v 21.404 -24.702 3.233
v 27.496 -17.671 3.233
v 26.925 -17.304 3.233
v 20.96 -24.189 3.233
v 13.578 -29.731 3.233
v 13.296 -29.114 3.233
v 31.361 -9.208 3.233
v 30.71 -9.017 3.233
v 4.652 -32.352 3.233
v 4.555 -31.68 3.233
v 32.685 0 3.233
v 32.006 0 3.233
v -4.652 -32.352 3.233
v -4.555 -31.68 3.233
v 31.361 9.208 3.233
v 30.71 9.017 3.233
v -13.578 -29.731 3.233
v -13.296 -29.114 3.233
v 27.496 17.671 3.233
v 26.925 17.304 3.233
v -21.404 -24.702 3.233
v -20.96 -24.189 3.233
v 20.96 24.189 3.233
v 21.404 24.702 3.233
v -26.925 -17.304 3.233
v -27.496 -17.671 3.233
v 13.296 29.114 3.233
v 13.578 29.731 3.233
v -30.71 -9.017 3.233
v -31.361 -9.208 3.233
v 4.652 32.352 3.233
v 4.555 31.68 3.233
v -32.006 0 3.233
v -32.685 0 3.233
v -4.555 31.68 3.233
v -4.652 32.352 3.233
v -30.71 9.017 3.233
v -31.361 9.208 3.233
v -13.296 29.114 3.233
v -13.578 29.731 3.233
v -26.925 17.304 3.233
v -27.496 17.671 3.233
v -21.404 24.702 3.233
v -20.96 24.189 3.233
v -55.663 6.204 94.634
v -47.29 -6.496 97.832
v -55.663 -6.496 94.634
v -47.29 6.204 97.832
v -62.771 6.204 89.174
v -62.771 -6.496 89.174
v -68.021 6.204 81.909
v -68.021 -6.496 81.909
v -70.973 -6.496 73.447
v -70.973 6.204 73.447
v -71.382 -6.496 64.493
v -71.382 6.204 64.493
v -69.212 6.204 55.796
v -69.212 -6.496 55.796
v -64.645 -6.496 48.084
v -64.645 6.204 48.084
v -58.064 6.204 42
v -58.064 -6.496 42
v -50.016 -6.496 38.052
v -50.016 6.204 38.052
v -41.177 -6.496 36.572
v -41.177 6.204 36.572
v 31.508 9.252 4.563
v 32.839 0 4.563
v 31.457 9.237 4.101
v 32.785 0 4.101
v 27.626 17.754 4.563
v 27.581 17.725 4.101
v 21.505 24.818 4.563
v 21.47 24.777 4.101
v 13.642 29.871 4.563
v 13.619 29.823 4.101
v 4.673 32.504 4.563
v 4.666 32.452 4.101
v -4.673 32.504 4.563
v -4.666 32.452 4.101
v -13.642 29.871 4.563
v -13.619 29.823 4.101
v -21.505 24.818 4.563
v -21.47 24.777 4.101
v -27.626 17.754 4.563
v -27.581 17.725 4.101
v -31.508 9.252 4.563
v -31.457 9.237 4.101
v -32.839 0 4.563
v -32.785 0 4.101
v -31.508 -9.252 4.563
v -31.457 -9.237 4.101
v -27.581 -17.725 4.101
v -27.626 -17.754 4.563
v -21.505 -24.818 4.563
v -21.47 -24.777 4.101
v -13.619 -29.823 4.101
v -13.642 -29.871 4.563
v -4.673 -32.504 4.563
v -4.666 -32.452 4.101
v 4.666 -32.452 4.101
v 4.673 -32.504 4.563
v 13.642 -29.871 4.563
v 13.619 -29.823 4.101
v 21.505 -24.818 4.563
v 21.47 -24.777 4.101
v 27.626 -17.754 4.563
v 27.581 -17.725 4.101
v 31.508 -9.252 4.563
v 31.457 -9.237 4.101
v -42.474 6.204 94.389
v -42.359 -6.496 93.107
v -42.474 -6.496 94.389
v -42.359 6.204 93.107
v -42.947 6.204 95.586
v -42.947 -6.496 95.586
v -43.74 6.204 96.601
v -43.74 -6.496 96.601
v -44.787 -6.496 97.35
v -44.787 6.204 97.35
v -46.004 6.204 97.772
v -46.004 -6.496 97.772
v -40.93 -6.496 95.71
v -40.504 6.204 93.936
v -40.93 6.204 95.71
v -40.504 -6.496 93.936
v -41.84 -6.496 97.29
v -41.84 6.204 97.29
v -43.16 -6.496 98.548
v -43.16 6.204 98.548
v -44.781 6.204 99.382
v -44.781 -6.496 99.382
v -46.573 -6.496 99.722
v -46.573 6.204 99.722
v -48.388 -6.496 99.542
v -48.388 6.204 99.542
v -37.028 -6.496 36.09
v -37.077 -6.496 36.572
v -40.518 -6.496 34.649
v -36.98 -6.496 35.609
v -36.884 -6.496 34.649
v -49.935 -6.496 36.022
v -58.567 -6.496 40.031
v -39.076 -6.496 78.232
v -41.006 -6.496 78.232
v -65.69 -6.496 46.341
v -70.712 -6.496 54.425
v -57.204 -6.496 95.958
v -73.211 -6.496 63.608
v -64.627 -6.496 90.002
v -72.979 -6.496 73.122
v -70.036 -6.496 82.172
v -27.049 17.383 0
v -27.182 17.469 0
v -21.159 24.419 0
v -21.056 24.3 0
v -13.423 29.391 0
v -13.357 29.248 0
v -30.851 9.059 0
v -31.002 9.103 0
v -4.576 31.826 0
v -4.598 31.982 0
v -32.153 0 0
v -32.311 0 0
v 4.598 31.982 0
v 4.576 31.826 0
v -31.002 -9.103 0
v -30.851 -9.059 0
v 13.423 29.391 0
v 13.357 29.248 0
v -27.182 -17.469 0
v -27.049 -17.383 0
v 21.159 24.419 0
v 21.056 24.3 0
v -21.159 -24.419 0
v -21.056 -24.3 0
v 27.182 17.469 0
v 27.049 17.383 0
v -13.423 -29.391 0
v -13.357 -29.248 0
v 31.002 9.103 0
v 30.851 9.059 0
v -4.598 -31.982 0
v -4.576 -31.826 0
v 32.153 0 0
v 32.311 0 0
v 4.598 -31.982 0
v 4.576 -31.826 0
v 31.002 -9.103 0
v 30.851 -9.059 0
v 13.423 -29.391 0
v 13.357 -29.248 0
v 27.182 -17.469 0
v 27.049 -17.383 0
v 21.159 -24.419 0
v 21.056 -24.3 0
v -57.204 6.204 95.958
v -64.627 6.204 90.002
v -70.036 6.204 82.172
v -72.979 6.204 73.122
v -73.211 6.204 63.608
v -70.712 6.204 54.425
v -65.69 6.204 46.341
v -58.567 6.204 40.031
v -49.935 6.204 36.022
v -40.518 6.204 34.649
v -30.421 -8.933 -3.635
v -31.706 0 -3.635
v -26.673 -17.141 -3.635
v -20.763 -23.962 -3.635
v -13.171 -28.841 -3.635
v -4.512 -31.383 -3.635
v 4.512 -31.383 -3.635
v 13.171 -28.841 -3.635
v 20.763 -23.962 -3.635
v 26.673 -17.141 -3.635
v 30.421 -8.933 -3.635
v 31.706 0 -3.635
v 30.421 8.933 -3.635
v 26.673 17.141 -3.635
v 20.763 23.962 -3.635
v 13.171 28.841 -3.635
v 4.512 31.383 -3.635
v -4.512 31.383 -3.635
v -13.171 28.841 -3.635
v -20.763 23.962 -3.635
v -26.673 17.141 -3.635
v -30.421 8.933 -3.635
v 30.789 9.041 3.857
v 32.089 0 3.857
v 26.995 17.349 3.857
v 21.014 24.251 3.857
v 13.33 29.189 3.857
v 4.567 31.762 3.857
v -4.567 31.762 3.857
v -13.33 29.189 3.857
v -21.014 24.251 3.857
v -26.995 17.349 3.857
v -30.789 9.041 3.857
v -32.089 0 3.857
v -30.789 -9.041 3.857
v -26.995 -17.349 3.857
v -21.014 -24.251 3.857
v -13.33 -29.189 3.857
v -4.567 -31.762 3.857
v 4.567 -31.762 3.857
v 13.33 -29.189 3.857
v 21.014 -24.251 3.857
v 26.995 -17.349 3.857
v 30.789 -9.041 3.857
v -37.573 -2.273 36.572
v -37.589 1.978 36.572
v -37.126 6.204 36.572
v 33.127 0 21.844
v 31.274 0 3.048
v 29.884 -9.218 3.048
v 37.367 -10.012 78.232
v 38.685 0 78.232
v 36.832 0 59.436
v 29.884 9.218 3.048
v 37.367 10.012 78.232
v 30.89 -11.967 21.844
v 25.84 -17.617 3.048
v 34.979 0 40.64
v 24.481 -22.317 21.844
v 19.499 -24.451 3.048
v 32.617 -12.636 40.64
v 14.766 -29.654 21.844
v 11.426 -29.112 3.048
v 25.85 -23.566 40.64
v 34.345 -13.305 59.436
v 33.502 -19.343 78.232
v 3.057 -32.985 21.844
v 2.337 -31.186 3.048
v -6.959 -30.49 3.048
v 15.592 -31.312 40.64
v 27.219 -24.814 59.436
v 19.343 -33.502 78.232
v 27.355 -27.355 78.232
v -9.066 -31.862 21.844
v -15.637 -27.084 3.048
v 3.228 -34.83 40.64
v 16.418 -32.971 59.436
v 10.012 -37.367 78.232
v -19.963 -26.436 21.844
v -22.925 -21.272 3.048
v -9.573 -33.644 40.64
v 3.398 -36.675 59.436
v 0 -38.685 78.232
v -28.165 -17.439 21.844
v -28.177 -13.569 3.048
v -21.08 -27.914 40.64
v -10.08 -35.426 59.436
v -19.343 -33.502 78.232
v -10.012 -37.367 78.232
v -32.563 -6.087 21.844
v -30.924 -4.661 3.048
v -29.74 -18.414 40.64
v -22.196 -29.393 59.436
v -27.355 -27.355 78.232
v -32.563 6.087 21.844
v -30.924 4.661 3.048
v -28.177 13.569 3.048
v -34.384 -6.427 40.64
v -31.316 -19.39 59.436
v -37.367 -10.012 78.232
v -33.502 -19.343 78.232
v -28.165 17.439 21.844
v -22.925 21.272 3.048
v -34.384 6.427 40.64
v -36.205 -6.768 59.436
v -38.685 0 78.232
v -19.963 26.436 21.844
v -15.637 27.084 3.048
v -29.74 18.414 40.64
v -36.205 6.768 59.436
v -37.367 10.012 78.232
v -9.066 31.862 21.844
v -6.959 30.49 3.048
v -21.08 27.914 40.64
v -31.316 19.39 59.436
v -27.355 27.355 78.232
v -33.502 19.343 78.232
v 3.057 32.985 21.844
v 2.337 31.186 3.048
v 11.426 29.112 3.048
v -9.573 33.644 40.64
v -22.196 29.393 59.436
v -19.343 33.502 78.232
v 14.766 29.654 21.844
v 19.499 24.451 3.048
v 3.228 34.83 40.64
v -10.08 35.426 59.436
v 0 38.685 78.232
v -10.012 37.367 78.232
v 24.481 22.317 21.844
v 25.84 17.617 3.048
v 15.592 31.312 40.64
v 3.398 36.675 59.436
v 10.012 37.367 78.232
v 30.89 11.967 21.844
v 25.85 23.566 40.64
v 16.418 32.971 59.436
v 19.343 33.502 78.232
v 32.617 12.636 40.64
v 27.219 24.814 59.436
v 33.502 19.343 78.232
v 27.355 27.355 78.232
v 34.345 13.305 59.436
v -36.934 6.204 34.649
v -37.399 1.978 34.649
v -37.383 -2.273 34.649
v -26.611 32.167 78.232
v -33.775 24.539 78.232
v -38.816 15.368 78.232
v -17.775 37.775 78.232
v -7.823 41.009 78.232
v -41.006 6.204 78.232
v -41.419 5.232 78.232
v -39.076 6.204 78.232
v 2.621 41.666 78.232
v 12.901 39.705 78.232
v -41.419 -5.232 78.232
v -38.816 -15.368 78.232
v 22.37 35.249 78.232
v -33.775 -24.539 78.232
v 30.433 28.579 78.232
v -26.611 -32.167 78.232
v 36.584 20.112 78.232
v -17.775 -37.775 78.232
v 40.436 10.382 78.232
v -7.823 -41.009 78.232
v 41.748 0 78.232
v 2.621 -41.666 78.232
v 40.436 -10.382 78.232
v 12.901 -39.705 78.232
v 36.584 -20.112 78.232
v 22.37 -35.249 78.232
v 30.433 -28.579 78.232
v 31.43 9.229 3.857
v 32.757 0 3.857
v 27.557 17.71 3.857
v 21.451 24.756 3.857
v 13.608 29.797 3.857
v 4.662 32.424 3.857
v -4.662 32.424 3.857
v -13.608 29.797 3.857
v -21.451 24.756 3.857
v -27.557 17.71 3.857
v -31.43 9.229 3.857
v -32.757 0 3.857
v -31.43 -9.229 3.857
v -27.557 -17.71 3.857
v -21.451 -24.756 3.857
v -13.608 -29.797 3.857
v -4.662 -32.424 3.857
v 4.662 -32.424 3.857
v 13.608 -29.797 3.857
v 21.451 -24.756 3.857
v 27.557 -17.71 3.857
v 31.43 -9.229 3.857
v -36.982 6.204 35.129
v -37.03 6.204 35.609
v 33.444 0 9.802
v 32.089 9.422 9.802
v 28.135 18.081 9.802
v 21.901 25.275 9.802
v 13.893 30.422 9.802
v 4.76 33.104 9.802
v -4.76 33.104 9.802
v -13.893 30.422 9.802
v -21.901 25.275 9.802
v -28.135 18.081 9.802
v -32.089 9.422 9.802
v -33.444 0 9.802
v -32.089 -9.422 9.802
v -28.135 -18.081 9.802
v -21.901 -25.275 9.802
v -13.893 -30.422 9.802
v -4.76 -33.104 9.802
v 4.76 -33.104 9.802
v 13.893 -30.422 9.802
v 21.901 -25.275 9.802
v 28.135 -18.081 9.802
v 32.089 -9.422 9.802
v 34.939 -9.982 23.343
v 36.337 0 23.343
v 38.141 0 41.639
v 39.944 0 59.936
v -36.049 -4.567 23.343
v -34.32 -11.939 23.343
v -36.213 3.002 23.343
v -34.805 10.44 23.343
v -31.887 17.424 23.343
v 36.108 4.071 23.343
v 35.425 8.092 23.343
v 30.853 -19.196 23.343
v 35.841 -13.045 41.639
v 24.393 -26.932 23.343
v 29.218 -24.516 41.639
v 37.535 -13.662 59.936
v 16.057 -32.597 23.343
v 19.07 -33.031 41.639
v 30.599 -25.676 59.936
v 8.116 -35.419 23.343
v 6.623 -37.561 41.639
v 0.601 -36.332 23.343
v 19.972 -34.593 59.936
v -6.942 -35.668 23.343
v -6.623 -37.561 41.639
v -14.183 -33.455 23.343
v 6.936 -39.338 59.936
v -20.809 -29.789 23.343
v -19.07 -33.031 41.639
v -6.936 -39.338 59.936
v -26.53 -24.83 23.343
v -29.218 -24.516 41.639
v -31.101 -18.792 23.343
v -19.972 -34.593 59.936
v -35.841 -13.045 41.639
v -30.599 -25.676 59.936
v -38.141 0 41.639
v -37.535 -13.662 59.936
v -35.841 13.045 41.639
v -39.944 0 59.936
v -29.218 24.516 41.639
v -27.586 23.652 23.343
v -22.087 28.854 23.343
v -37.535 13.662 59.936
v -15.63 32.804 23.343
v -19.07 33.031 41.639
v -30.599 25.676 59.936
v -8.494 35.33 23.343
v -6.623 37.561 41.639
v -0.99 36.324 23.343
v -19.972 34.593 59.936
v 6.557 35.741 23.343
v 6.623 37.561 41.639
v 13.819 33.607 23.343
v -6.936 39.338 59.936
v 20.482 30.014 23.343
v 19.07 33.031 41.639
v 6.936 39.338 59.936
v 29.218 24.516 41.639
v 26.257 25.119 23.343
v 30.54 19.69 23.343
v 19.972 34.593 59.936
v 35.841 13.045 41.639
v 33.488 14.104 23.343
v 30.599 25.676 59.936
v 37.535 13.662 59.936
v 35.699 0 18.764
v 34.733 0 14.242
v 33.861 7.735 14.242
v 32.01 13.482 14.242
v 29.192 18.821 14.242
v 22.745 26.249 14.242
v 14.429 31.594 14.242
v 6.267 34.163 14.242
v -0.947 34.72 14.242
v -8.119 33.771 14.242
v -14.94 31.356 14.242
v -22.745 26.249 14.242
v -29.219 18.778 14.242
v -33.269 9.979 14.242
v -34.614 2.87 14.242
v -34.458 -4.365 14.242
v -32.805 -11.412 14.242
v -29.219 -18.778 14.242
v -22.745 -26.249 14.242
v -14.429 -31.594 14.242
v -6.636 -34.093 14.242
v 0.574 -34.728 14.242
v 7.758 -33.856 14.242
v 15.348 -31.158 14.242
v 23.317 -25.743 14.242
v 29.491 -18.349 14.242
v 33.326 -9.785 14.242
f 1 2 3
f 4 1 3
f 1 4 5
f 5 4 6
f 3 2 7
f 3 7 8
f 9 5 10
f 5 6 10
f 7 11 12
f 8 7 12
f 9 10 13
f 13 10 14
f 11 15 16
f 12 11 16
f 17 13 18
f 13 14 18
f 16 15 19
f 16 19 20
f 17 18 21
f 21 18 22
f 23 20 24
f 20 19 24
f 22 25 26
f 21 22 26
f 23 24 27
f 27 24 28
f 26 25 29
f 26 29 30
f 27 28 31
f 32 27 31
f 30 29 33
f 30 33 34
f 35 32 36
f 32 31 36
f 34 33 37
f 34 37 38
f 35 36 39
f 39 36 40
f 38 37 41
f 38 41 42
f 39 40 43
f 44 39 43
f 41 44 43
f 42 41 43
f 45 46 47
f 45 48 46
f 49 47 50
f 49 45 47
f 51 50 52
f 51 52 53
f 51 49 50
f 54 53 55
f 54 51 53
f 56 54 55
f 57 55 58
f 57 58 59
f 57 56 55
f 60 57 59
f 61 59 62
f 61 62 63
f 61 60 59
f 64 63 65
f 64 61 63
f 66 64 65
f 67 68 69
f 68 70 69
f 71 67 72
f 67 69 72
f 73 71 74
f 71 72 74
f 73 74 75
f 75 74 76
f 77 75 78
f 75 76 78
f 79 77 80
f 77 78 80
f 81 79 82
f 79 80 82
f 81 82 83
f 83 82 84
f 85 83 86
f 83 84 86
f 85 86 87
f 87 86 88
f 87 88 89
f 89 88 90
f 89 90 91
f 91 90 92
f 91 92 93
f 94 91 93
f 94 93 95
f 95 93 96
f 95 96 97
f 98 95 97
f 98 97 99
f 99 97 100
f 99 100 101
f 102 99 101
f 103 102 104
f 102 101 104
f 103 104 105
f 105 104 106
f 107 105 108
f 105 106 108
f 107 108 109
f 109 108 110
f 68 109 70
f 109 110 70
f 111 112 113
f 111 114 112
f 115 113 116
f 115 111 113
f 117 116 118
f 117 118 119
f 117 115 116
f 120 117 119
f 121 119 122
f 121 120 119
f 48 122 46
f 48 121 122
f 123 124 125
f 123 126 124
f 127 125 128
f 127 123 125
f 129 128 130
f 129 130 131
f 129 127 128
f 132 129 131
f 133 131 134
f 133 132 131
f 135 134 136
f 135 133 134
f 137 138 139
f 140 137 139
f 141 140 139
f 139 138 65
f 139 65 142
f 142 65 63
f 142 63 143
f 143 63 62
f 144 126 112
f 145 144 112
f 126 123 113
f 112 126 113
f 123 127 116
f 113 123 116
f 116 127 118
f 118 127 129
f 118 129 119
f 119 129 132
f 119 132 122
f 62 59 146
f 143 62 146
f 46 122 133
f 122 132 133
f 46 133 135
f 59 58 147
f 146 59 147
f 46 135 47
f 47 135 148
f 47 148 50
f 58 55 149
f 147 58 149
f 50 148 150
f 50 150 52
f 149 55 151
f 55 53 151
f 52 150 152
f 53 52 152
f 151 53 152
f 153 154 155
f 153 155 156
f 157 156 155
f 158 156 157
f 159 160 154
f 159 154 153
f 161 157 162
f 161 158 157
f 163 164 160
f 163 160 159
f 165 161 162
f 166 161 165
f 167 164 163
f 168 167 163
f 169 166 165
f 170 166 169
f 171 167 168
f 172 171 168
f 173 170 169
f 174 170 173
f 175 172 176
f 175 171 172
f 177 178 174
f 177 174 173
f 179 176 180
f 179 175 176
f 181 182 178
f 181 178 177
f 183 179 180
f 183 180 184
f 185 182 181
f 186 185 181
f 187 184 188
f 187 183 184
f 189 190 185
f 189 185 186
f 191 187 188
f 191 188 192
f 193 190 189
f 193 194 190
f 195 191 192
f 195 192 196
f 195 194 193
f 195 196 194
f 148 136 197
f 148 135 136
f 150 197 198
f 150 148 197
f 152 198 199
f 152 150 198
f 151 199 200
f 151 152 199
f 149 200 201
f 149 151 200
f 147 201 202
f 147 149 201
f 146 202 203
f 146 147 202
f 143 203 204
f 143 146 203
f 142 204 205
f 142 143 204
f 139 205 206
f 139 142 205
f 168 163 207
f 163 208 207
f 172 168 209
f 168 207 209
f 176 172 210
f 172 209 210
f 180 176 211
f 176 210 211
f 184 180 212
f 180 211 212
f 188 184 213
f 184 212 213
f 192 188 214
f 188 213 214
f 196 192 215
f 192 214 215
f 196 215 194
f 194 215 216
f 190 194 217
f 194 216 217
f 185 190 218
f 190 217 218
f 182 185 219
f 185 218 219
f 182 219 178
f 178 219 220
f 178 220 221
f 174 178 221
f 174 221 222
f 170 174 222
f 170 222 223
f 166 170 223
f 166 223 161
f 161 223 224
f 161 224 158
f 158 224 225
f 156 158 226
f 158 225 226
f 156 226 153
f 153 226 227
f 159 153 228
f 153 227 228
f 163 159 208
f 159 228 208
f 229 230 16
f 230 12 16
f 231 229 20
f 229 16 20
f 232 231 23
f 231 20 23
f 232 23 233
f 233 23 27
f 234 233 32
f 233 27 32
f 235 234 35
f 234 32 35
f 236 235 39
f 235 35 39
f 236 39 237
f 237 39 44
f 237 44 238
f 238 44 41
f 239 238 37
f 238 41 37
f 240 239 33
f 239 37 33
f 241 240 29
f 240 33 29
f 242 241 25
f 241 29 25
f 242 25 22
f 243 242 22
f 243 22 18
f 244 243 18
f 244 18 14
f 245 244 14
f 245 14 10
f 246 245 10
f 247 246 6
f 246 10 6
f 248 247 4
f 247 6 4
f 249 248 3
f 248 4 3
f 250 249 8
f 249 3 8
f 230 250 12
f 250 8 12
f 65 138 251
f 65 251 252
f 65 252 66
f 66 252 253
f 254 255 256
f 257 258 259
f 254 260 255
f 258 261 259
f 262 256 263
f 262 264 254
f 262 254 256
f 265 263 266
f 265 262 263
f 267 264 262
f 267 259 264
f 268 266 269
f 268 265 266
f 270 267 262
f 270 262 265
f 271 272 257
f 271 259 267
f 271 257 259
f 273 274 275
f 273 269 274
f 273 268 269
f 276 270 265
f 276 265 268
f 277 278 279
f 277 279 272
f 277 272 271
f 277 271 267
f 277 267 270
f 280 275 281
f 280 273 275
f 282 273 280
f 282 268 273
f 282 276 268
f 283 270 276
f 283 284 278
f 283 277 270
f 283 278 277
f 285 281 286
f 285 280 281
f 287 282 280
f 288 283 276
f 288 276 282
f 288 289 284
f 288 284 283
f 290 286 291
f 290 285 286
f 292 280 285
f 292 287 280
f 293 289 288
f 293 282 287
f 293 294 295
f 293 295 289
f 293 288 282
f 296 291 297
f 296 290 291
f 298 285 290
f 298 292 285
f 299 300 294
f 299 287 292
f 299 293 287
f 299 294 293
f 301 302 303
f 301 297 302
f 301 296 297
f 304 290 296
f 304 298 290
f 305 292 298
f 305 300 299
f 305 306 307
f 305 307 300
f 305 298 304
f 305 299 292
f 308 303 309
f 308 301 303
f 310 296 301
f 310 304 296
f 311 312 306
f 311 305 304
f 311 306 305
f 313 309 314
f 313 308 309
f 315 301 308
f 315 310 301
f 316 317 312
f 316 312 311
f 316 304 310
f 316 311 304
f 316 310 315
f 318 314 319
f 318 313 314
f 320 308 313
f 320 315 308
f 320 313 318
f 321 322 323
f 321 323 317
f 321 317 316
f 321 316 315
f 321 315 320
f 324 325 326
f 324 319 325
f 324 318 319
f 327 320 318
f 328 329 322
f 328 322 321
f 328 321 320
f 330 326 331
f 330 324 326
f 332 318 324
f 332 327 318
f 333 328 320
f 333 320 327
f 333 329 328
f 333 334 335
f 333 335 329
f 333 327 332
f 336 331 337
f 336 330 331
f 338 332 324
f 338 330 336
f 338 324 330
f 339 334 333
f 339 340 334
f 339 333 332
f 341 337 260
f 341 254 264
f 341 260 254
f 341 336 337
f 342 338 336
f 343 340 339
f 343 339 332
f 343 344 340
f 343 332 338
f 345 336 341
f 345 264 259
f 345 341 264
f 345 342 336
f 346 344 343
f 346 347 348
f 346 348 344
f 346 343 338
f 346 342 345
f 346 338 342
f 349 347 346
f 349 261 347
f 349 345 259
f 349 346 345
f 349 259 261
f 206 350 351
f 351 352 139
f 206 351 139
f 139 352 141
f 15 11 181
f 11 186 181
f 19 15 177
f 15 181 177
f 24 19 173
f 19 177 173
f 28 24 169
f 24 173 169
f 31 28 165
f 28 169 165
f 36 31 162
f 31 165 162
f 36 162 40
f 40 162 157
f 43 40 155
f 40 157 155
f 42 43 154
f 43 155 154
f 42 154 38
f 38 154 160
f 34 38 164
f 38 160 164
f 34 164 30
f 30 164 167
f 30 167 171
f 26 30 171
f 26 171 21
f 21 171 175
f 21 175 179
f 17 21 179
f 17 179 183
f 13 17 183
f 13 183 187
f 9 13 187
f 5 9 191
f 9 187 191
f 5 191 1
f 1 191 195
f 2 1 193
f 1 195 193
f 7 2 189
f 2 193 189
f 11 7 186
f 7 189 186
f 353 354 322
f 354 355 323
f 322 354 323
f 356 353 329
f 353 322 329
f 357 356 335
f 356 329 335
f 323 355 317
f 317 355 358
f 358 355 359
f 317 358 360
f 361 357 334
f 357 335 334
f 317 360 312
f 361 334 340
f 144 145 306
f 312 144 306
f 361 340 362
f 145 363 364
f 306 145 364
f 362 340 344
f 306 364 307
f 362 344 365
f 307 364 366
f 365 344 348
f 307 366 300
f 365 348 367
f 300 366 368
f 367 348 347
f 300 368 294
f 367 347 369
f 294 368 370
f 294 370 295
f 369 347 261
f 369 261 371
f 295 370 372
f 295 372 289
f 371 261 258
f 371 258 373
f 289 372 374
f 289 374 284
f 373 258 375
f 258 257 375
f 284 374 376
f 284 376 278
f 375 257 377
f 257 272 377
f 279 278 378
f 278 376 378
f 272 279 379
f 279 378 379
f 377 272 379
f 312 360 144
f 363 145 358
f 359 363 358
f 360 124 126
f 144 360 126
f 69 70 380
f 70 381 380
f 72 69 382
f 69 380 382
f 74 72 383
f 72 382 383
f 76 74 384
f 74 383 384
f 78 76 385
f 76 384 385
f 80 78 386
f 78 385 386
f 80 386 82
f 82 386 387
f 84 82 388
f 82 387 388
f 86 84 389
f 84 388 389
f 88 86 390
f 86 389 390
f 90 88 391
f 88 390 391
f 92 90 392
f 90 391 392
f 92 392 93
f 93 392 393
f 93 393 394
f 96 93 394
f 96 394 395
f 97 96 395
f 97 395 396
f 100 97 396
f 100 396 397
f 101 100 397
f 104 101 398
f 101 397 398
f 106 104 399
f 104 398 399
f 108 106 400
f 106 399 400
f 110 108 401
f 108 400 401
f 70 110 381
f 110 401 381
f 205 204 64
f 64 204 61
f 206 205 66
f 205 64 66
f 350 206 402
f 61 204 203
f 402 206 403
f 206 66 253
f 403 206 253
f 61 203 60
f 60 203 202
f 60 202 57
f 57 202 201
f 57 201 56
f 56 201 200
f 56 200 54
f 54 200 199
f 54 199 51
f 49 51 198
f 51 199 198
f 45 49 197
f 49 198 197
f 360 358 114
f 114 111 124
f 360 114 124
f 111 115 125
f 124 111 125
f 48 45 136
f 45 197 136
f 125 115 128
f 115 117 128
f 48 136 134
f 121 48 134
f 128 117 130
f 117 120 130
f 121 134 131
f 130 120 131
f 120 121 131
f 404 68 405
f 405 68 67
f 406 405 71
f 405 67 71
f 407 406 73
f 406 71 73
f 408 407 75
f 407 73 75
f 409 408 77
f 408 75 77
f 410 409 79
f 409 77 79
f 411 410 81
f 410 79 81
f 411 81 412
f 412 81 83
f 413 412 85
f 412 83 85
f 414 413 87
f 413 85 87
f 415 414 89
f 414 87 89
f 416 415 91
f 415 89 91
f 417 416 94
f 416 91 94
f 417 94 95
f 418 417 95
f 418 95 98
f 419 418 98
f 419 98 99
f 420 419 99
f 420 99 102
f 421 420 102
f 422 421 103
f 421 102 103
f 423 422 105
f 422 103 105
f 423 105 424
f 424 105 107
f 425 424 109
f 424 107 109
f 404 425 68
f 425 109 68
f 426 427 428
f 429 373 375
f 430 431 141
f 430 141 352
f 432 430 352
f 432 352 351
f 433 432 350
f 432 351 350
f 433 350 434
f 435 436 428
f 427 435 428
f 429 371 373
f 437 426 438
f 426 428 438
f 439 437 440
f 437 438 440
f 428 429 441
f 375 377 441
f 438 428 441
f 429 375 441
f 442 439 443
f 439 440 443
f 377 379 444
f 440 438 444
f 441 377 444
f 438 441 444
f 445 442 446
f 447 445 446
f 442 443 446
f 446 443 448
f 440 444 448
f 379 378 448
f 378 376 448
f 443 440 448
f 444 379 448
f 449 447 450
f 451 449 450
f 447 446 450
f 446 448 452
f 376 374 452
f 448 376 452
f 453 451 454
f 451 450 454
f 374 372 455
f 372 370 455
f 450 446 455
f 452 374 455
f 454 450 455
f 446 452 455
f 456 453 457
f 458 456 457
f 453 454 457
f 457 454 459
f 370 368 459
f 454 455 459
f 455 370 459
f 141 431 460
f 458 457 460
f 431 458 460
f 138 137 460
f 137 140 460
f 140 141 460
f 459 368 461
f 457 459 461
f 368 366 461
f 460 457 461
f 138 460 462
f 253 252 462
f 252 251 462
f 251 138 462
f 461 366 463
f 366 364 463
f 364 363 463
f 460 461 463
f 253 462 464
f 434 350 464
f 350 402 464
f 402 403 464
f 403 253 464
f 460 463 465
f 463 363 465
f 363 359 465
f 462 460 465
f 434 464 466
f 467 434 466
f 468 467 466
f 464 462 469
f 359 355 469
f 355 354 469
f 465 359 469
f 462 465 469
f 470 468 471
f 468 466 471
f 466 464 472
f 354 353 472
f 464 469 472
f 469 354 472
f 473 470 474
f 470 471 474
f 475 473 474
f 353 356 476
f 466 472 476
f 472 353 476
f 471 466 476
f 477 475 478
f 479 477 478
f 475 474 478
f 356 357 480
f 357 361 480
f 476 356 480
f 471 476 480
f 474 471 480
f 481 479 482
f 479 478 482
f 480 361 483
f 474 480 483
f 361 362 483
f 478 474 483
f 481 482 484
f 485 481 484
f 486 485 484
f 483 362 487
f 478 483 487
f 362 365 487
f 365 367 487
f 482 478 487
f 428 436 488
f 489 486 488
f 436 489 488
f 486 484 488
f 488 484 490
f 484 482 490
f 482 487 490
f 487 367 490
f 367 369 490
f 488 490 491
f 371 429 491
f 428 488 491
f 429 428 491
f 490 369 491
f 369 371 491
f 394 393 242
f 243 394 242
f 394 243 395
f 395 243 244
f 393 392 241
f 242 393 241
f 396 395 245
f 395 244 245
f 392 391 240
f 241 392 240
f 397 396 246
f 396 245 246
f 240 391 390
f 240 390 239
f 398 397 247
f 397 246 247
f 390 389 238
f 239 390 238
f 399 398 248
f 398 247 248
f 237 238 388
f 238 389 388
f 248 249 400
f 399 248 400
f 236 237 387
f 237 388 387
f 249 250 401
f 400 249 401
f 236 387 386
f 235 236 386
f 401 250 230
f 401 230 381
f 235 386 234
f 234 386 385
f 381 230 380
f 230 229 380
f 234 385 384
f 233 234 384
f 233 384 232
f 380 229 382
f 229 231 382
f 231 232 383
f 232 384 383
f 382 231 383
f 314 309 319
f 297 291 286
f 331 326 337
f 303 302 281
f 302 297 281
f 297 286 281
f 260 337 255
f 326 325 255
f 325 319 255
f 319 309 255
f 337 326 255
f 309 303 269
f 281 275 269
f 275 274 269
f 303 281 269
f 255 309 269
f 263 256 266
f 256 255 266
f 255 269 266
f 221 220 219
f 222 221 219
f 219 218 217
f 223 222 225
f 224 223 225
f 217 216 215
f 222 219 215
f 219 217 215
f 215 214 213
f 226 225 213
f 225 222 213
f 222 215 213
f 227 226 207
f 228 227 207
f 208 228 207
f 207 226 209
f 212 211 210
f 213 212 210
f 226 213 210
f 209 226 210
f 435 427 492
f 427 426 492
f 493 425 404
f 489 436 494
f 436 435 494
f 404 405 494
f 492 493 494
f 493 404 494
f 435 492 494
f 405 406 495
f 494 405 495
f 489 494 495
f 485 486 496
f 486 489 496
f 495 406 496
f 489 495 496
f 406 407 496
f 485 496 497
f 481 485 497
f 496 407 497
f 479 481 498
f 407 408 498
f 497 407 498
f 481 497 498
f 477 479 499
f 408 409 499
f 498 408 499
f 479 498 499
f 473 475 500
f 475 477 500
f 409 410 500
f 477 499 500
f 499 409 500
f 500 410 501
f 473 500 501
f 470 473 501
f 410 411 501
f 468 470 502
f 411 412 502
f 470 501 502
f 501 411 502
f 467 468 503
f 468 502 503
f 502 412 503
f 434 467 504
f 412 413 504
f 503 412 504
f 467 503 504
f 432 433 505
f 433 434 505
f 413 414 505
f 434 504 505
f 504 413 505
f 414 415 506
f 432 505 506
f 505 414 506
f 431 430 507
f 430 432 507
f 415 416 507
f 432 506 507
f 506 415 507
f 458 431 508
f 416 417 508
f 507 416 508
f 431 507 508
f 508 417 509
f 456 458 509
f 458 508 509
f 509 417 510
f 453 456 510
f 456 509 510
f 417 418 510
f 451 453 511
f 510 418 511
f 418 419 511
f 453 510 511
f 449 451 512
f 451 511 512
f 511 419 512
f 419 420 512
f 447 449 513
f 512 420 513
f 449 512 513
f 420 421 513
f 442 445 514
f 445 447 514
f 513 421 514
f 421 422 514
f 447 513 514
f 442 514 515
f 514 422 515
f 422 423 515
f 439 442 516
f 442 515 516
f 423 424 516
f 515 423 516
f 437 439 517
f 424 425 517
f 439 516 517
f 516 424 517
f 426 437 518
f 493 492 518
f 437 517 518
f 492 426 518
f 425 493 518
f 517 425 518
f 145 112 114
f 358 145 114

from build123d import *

# Parameters (mm, degrees)
F0_R     = 33.02
F1_DEPTH = 78.232
F1_TAPER = -5.63
F3_R     = 34.036
F3_R_2   = 33.02
F4_DEPTH = 78.232
F4_TAPER = -5.63
F5_T     = -3.048
F9_W     = 2.032
F9_H     = 12.7


with BuildPart() as f1:
    # F0 (on Top) → F1 (new body)
    with BuildSketch(Plane.XY):
        Circle(F0_R)
    extrude(amount=F1_DEPTH, taper=F1_TAPER)

    # F3 (on face) → F4 (join)
    with BuildSketch(Plane(origin=(0, 0, 0), x_dir=(1, 0, 0), z_dir=(0, 0, -1))):
        Circle(F3_R)
        Circle(F3_R_2, mode=Mode.SUBTRACT)
    extrude(amount=-F4_DEPTH, taper=F4_TAPER)

    # F5
    f5_openings = [f1.faces().sort_by_distance(p)[0] for p in [
        (0, 0, 78.232),
    ]]
    offset(amount=F5_T, openings=f5_openings, kind=Kind.INTERSECTION)

    # F6 (on Front) → F7 (revolve, cut)
    with BuildSketch(Plane.XZ):
        with BuildLine():
            Line((32.6848506642, 3.2326551154), (32.3112107695, 0))
            Line((32.3112107695, 0), (44.0889932215, 0))
            Line((44.0889932215, 0), (44.0889932215, 54.3507039547))
            Line((44.0889932215, 54.3507039547), (39.4513271749, 54.3507039547))
            Line((39.4513271749, 54.3507039547), (39.3896299843, 54.2361003943))
            Line((39.3896299843, 54.2361003943), (36.3627001643, 23.5965643078))
            ThreePointArc((36.3627001643, 23.5965643078), (35.2832636057, 16.619062002), (33.4441874208, 9.8022797333))
            Line((33.4441874208, 9.8022797333), (32.8385867178, 4.5627476647))
            Line((32.8385867178, 4.5627476647), (32.7852428872, 4.1012278712))
            Line((32.7852428872, 4.1012278712), (32.7570124771, 3.8569842))
            Line((32.7570124771, 3.8569842), (32.0890299447, 3.8569842))
            Line((32.0890299447, 3.8569842), (32.0060770141, 3.2326551154))
            Line((32.0060770141, 3.2326551154), (32.6848506642, 3.2326551154))
        make_face()
    revolve(axis=Axis((0, 0, 38.8779193163), (0, 0, 1)), mode=Mode.SUBTRACT)

    # F2 (on Front) → F10 (revolve)
    with BuildSketch(Plane.XZ):
        Polygon((0, -3.6346768029), (0, 0), (-32.1533791721, 0), (-31.7057520151, -3.6346768029), align=None)
    revolve(axis=Axis((0, 0, -1.8173384015), (0, 0, 1)))

    # F11: sweep along a path in F8
    with BuildLine(Plane.XZ) as f11_path:
        Line((-38.7114321376, 73.8900886301), (-40.5326529346, 93.9235173966))
        ThreePointArc((-40.5326529346, 93.9235173966), (-43.168569243, 98.5178624573), (-48.3705692501, 99.5154882628))
        ThreePointArc((-48.3705692501, 99.5154882628), (-73.1825968463, 63.6219410958), (-40.5282266438, 34.6793159842))
        Line((-40.5282266438, 34.6793159842), (-35.0613184273, 34.6793159842))
    # F9 (on face) → F11 (sweep)
    with BuildSketch(Plane.XY.offset(78.232)):
        with Locations((-70.6608099122, -0.1456312999)):
            Rectangle(F9_W, F9_H)
    sweep(path=f11_path.line)


solid = f1.part
